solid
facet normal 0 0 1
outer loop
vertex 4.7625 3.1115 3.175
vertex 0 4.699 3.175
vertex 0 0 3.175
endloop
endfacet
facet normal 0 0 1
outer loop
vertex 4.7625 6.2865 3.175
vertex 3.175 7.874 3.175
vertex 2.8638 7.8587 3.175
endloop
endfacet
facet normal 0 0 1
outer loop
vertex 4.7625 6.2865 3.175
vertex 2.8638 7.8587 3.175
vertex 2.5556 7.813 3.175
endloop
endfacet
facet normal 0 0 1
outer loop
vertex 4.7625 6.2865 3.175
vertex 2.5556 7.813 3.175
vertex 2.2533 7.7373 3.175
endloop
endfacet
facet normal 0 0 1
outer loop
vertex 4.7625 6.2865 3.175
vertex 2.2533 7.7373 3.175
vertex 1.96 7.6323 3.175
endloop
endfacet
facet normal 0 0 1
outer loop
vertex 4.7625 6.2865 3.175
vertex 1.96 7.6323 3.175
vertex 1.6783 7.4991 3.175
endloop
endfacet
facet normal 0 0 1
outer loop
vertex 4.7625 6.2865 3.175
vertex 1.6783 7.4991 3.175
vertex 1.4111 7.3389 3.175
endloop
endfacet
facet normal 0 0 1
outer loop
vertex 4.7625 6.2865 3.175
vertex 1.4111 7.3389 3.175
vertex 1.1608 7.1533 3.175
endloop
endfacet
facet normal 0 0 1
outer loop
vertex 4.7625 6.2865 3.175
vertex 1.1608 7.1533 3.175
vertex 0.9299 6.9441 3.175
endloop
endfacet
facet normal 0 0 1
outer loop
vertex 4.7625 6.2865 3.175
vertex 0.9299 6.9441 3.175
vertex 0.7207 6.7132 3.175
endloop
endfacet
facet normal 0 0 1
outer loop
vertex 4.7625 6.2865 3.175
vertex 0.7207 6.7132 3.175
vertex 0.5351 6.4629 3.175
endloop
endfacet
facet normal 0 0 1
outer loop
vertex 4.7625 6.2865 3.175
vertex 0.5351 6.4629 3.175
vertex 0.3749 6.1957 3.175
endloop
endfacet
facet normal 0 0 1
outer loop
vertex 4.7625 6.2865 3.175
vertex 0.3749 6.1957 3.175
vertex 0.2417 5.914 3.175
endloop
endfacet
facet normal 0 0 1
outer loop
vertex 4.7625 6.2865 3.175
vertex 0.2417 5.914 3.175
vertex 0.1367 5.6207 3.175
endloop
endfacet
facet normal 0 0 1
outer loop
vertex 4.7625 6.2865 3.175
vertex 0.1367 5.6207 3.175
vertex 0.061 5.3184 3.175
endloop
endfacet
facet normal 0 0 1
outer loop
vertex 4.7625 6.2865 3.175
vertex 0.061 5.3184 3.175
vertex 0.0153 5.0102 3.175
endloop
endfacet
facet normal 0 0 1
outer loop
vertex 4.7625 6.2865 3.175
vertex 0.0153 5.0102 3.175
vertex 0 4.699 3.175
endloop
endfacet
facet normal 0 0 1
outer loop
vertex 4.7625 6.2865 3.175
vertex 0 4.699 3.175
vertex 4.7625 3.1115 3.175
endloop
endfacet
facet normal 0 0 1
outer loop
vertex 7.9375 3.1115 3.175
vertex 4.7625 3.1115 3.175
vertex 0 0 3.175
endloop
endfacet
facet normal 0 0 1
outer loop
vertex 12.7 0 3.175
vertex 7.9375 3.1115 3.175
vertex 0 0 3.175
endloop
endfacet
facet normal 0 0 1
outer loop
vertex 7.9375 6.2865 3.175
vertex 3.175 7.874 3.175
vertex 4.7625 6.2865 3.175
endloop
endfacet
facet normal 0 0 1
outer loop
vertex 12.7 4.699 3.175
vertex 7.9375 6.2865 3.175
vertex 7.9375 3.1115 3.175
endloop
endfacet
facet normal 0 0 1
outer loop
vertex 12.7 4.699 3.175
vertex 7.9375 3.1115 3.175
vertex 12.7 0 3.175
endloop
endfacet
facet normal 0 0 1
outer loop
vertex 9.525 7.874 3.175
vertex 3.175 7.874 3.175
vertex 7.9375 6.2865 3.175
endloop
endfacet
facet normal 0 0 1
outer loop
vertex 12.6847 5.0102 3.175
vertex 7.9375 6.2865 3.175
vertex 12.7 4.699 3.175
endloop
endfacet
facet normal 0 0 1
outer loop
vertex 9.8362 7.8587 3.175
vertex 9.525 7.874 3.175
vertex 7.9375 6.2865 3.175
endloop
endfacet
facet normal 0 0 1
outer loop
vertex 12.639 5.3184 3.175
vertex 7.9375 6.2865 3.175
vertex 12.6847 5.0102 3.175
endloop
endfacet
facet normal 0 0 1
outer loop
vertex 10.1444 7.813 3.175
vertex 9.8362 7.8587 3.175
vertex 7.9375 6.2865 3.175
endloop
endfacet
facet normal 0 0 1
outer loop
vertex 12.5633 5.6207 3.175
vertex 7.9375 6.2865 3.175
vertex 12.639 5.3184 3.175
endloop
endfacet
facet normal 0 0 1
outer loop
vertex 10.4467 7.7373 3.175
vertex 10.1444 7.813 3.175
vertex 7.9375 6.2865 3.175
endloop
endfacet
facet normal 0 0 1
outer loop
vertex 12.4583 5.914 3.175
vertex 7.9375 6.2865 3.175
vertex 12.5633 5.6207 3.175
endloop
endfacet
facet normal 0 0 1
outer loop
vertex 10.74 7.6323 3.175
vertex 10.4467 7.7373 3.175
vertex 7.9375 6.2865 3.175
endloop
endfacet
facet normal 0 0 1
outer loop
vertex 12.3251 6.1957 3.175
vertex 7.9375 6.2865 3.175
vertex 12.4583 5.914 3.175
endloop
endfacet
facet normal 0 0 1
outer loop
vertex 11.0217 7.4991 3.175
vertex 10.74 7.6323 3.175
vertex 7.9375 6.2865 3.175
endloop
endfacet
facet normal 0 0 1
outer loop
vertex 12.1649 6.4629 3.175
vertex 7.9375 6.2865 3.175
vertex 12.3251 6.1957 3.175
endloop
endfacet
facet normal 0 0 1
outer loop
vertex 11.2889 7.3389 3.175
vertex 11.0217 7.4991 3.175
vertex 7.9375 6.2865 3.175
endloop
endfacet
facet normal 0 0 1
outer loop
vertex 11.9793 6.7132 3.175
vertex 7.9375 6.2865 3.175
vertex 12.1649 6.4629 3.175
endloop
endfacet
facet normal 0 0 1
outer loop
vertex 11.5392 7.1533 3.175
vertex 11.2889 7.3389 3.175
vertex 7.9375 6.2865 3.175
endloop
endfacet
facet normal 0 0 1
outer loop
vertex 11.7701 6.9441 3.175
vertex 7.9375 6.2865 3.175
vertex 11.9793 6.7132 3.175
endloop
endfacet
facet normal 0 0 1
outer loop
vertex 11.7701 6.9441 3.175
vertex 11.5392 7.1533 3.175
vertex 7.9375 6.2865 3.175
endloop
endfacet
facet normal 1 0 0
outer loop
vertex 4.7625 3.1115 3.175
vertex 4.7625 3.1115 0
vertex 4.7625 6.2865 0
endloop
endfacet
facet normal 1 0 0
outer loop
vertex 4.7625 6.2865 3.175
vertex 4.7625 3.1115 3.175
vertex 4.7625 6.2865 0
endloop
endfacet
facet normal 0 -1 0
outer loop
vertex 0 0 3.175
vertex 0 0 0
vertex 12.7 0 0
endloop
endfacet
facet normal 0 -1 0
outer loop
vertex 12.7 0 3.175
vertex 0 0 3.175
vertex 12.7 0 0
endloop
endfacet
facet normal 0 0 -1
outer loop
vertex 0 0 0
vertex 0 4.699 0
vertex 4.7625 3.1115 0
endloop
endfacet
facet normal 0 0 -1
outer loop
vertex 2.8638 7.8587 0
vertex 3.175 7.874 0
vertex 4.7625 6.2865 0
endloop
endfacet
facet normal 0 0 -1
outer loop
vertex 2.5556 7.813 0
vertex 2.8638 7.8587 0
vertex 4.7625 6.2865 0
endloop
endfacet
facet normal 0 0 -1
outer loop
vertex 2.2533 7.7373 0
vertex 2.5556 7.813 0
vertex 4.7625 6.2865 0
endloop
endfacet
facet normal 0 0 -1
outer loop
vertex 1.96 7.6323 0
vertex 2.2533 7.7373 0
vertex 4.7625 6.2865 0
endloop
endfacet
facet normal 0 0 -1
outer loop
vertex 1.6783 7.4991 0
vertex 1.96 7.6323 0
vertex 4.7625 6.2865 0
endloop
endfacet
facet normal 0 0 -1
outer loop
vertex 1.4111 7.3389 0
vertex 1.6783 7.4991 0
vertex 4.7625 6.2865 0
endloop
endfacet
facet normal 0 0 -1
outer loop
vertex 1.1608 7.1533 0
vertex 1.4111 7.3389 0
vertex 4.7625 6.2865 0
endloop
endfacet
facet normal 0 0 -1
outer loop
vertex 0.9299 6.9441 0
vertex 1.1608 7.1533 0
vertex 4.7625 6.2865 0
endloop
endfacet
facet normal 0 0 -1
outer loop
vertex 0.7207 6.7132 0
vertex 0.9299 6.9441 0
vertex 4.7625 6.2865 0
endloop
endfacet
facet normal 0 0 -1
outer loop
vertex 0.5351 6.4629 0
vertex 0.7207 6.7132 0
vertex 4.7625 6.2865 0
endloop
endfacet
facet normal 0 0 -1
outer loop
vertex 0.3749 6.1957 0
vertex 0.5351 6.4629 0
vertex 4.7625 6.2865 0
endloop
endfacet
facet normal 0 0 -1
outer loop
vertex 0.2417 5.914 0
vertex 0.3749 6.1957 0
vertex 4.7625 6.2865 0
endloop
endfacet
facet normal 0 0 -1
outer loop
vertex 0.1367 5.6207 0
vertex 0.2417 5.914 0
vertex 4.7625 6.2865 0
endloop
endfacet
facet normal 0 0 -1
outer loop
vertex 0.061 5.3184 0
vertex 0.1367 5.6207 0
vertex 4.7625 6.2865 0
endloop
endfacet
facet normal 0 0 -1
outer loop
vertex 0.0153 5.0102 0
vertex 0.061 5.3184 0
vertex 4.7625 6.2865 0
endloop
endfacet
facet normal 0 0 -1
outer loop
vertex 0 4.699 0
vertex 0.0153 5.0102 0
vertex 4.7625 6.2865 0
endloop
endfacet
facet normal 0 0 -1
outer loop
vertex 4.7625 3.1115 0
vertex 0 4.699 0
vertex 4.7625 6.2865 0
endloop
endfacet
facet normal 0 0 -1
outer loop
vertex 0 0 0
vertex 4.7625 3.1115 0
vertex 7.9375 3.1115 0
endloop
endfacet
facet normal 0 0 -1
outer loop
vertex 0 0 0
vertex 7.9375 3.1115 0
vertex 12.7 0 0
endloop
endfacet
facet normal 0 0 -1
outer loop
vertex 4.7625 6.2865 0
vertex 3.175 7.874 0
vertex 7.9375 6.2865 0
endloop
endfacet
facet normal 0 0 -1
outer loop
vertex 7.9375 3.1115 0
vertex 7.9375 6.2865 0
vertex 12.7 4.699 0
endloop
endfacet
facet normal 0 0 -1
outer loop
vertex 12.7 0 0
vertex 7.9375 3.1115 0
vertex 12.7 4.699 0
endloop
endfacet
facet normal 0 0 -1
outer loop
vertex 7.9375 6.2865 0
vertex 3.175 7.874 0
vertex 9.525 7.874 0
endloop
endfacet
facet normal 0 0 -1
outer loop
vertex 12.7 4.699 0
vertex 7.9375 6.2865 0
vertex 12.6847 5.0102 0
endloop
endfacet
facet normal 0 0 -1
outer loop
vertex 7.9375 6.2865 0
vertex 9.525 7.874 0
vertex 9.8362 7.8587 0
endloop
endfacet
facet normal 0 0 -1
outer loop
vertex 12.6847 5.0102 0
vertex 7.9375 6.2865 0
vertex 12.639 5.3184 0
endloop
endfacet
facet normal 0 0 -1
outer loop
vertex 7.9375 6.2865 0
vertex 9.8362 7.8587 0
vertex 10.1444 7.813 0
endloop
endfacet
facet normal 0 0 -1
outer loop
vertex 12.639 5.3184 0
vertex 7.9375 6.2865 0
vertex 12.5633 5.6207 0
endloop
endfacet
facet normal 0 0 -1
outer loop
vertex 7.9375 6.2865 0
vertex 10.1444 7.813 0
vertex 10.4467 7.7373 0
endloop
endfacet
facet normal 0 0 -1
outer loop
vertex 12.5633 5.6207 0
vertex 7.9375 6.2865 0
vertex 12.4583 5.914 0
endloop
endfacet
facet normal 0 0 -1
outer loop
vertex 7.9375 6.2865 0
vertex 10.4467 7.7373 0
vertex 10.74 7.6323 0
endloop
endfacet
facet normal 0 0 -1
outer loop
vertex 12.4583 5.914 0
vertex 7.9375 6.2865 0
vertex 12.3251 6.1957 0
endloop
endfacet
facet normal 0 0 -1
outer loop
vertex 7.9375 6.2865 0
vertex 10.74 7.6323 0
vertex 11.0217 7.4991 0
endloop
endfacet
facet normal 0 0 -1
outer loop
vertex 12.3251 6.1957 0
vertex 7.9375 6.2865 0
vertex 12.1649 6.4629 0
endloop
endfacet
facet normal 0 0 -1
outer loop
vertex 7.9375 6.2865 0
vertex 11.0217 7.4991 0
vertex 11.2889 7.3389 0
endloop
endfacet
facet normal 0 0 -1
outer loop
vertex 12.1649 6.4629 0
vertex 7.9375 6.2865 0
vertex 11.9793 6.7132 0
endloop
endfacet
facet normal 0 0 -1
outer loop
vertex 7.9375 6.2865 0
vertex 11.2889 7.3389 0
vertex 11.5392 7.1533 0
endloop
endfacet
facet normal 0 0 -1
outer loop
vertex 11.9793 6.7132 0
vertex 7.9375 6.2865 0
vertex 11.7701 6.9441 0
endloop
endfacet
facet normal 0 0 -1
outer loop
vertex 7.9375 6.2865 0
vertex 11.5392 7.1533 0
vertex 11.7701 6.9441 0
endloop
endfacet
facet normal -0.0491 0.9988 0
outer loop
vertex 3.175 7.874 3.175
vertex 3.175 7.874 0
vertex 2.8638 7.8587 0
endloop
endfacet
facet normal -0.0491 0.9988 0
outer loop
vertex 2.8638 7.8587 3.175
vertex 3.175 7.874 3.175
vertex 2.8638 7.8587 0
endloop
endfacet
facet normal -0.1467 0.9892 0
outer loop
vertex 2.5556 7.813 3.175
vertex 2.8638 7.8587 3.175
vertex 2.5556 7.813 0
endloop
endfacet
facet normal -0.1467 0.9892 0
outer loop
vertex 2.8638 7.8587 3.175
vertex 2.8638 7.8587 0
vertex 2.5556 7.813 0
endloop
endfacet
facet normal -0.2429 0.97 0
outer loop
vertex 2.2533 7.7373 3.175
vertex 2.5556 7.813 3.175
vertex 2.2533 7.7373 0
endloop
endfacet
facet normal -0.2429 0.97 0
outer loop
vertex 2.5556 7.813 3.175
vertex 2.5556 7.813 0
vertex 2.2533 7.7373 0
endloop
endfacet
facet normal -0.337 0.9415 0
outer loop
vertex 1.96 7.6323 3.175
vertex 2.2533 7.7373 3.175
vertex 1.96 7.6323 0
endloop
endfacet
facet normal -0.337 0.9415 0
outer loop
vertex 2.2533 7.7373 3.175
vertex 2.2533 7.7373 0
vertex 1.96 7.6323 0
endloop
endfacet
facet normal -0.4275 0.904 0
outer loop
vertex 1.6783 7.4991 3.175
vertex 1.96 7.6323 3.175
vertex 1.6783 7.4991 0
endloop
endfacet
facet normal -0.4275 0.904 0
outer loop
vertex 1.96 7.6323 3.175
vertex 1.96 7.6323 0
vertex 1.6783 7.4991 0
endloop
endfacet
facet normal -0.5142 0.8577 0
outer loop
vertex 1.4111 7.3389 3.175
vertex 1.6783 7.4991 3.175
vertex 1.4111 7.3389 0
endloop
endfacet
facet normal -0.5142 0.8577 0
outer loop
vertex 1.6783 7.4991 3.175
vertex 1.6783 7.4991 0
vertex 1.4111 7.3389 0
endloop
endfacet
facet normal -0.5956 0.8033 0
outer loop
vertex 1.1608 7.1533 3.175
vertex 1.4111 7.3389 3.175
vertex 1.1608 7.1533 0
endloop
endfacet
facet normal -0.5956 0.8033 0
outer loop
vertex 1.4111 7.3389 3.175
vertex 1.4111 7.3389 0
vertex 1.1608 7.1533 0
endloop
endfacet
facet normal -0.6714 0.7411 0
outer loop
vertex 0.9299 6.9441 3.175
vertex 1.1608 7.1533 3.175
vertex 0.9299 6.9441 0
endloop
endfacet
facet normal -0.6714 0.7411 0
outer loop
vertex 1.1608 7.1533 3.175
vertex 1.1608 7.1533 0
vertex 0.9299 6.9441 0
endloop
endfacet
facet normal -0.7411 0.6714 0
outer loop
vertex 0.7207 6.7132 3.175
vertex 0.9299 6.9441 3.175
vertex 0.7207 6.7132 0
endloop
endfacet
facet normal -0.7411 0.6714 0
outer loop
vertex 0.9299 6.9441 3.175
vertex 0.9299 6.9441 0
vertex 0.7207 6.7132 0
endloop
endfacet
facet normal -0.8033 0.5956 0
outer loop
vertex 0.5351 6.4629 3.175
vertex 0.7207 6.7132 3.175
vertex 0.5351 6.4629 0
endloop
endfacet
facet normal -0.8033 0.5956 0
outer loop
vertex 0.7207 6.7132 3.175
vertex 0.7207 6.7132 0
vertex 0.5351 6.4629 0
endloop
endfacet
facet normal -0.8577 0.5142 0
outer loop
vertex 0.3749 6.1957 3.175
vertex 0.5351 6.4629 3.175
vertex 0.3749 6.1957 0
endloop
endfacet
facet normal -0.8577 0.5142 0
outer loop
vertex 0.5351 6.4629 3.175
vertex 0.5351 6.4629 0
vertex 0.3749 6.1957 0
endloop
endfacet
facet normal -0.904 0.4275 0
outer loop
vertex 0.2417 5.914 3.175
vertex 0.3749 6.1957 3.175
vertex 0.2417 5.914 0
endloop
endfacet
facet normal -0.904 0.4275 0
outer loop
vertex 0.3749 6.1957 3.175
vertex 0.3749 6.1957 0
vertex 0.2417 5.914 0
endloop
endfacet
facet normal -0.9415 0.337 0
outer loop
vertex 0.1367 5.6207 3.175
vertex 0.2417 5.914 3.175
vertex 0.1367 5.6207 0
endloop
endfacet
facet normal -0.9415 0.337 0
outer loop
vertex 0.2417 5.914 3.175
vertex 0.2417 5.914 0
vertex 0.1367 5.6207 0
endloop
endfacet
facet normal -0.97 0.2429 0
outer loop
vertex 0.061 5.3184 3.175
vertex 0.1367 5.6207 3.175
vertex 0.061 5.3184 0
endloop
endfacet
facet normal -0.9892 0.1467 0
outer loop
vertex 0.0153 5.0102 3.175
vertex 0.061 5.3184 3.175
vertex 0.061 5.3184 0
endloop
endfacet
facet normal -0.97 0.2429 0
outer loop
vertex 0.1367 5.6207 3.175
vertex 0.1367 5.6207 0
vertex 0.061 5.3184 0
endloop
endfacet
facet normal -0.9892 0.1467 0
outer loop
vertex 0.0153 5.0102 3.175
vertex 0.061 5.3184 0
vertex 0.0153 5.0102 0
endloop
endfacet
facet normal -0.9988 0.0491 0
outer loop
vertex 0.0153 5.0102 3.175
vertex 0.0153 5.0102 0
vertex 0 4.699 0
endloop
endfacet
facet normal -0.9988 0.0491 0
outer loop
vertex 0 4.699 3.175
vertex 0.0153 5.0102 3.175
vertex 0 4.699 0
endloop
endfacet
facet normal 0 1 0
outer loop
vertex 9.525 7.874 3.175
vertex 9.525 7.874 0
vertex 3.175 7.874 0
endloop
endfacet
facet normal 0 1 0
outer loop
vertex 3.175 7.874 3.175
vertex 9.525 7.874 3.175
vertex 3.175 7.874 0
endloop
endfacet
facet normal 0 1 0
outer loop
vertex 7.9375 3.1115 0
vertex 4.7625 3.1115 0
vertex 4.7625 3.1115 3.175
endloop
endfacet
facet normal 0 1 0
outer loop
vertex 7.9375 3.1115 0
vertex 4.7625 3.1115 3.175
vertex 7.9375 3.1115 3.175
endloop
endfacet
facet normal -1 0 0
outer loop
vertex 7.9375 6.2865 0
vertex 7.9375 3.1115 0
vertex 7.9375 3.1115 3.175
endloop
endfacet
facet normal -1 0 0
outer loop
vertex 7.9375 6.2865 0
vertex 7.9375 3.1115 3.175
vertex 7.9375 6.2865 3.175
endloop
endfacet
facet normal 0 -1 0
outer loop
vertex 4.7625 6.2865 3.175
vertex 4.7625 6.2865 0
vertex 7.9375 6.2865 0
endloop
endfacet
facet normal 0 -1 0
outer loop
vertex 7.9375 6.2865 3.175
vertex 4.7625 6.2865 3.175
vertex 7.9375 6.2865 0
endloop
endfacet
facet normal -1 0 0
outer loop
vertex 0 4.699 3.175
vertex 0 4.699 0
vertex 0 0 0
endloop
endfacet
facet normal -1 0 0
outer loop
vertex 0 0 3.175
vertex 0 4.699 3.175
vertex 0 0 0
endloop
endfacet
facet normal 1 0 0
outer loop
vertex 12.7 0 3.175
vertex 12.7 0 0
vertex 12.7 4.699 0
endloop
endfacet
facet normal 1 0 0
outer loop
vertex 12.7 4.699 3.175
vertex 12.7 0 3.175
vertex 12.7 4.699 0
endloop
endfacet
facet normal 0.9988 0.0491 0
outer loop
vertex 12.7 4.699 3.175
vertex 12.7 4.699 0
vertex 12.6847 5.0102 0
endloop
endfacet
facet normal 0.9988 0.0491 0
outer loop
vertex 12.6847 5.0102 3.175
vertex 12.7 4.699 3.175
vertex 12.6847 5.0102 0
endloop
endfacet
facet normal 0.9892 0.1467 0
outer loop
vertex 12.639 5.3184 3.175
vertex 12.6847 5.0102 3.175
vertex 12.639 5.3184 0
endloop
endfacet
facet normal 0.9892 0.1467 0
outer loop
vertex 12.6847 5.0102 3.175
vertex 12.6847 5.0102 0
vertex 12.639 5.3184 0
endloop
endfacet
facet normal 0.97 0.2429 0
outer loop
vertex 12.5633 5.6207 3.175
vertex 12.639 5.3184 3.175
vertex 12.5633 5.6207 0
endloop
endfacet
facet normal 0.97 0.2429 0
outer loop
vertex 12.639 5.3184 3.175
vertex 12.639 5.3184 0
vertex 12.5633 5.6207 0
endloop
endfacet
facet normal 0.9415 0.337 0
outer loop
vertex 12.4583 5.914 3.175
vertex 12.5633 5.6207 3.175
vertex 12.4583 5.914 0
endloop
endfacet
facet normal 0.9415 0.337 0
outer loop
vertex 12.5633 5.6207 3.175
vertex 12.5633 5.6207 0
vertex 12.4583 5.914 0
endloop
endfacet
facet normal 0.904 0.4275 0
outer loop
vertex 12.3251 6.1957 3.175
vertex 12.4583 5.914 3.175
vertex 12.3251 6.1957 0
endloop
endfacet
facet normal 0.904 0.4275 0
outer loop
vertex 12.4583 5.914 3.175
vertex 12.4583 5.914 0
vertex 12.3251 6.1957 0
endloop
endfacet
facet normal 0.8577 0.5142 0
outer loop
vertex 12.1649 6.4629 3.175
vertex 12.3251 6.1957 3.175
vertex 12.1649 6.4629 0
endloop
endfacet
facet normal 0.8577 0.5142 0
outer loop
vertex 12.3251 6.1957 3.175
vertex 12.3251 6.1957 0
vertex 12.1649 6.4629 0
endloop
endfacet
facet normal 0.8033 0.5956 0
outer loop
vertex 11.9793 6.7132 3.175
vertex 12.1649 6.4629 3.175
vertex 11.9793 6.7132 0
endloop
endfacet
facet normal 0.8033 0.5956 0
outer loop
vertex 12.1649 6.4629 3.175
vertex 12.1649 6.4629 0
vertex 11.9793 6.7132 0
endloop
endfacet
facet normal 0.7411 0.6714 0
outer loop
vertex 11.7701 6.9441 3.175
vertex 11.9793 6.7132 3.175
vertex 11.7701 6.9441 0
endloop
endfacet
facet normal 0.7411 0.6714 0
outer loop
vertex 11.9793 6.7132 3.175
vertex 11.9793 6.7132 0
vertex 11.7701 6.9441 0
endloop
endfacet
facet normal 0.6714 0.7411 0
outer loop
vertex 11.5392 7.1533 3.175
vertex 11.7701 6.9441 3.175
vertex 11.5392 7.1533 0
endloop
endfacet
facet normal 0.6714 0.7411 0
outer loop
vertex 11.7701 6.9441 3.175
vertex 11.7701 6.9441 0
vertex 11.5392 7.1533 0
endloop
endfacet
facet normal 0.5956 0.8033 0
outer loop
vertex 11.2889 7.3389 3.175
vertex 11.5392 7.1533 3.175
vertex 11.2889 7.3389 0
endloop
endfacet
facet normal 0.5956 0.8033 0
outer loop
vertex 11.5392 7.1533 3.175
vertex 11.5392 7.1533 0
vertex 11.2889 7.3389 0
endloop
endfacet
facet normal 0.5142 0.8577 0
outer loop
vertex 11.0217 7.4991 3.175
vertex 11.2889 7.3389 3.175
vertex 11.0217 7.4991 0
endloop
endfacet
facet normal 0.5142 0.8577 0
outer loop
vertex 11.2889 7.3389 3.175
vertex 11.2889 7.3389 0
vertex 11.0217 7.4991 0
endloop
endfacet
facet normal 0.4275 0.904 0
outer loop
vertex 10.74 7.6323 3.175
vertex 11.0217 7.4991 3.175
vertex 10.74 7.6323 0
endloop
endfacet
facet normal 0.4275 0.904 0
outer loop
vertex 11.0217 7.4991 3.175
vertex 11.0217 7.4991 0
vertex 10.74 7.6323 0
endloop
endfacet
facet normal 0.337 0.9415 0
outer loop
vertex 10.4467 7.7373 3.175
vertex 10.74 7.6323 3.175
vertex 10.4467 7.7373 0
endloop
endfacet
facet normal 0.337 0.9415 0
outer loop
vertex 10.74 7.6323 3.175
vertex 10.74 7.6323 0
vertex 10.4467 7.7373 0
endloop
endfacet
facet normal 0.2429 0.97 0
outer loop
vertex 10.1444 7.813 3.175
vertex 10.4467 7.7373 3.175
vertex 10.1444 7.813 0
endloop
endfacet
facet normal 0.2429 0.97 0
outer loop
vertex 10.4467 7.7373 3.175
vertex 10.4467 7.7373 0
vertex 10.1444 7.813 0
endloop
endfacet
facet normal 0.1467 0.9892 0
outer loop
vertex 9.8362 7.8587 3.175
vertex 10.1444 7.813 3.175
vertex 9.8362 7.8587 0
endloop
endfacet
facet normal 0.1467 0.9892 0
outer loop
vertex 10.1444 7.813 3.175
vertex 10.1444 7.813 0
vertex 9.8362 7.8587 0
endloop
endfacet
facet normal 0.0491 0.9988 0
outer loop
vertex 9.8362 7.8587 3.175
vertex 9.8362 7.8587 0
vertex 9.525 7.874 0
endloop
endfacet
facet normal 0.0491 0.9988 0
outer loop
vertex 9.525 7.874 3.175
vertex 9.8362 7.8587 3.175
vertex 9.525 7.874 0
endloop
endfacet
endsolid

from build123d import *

# Parameters (mm, degrees)
SKETCH1_W           = 3.175
SKETCH1_H           = 3.175
BOSS_EXTRUDE1_DEPTH = 3.175


with BuildPart() as part:
    # Sketch1 → Boss-Extrude1 (new body)
    with BuildSketch(Plane.XY):
        with BuildLine():
            Line((0, 0), (12.7, 0))
            Line((12.7, 0), (12.7, 4.699))
            ThreePointArc((12.7, 4.699), (11.77006403, 6.94406403), (9.525, 7.874))
            Line((9.525, 7.874), (3.175, 7.874))
            ThreePointArc((3.175, 7.874), (0.92993597, 6.94406403), (0, 4.699))
            Line((0, 4.699), (0, 0))
        make_face()
        with Locations((6.35, 4.699)):
            Rectangle(SKETCH1_W, SKETCH1_H, mode=Mode.SUBTRACT)
    extrude(amount=BOSS_EXTRUDE1_DEPTH)


solid = part.part
